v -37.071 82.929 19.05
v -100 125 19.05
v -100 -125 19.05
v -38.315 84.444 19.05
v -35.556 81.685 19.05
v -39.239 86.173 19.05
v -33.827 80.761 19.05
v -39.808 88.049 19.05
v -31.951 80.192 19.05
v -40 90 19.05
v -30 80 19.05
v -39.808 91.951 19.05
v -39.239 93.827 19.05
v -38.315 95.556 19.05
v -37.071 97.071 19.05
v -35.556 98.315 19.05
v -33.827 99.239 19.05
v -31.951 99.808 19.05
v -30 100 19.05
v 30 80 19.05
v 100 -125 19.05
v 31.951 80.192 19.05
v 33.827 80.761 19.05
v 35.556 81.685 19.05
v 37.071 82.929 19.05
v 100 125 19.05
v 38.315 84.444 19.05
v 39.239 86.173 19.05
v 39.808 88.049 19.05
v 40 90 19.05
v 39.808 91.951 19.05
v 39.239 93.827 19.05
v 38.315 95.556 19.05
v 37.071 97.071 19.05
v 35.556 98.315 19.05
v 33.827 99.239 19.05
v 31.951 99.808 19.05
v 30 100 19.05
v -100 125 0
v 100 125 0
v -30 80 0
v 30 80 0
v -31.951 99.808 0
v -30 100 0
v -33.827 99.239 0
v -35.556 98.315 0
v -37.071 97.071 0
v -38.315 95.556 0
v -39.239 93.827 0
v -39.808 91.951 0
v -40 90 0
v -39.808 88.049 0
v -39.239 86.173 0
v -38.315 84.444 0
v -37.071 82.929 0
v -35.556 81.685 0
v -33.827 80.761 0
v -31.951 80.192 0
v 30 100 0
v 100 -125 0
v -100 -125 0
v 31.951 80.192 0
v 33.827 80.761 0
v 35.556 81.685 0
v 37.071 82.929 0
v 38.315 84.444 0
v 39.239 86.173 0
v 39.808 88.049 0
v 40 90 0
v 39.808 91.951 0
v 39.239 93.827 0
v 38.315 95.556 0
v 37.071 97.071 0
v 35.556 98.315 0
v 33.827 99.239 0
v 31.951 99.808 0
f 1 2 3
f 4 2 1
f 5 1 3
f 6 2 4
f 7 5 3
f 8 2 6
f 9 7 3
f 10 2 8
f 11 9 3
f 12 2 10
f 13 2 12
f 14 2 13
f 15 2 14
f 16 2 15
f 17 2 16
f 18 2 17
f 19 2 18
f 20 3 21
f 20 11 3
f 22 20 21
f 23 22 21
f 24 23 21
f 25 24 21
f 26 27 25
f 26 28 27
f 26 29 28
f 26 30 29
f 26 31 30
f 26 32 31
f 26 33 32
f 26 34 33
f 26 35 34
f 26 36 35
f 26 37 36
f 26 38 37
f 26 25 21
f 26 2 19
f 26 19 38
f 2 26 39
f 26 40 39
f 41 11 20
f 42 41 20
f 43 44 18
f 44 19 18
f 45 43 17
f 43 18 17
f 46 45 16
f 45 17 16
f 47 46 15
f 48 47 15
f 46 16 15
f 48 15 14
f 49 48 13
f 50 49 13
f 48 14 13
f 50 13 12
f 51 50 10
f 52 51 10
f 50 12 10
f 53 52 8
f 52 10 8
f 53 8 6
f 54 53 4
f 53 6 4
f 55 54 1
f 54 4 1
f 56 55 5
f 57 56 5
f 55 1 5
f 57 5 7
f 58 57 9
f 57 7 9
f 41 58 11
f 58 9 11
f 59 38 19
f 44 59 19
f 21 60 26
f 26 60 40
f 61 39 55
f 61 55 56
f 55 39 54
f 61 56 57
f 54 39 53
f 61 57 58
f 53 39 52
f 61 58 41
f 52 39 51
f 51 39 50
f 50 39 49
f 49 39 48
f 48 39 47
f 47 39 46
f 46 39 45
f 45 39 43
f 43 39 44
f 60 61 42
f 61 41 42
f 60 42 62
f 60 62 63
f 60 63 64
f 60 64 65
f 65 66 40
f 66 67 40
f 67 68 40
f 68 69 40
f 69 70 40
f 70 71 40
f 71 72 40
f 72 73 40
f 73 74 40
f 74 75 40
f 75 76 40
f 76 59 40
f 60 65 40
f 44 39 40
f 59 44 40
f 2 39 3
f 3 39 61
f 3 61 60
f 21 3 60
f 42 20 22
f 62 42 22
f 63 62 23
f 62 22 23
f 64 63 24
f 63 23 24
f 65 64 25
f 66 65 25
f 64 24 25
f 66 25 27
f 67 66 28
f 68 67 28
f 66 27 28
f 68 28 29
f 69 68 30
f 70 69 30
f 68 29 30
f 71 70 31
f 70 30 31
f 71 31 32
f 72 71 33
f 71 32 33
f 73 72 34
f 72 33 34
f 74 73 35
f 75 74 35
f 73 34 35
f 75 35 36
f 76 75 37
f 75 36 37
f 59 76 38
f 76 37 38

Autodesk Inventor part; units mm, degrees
ref_plane "YZ Plane" through (0, 0, 0) normal (1, 0, 0) x (0, 1, 0)
ref_plane "XZ Plane" through (0, 0, 0) normal (0, 1, 0) x (-1, 0, 0)
ref_plane "XY Plane" through (0, 0, 0) normal (0, 0, 1) x (1, 0, 0)
sketch "Sketch1" plane through (0, 0, 0) normal (0, 0, 1) x (1, 0, 0)
  line L0 (-100, -125) -> (100, -125)
  line L1 (100, -125) -> (100, 125)
  line L2 (100, 125) -> (-100, 125)
  line L3 (-100, 125) -> (-100, -125)
  line L4 (-100, -125) -> (100, 125) construction
  line L5 (100, -125) -> (-100, 125) construction
  point P0 (0, 0)
  dimension "Height" = 250
  dimension "Width" = 200
extrude "Extrusion1" add sketch "Sketch1" along normal blind 19.05
sketch "Sketch2" plane through (0, 0, 19.05) normal (0, 0, 1) x (1, 0, 0)
  line L0 (-30, 90) -> (30, 90) construction
  line L1 (-30, 80) -> (30, 80)
  line L2 (30, 100) -> (-30, 100)
  arc A0 (-30, 100) -> (-30, 80) centre (-30, 90) ccw
  arc A1 (30, 80) -> (30, 100) centre (30, 90) ccw
  line L3 (100, 125) -> (-100, 125) projected
  point P0 (0, 0)
  point P1 (0, 90)
  dimension "d4" = 30
  dimension "d5" = 20
  dimension "d6" = 25
extrude "Extrusion2" cut sketch "Sketch2" against normal up to surface (19.05 mm away)
equation "\"d7\" = thickness"
equation "\"thickness\" = 19.05"
properties part number "Creat Side" material "Wood (Cherry)"
